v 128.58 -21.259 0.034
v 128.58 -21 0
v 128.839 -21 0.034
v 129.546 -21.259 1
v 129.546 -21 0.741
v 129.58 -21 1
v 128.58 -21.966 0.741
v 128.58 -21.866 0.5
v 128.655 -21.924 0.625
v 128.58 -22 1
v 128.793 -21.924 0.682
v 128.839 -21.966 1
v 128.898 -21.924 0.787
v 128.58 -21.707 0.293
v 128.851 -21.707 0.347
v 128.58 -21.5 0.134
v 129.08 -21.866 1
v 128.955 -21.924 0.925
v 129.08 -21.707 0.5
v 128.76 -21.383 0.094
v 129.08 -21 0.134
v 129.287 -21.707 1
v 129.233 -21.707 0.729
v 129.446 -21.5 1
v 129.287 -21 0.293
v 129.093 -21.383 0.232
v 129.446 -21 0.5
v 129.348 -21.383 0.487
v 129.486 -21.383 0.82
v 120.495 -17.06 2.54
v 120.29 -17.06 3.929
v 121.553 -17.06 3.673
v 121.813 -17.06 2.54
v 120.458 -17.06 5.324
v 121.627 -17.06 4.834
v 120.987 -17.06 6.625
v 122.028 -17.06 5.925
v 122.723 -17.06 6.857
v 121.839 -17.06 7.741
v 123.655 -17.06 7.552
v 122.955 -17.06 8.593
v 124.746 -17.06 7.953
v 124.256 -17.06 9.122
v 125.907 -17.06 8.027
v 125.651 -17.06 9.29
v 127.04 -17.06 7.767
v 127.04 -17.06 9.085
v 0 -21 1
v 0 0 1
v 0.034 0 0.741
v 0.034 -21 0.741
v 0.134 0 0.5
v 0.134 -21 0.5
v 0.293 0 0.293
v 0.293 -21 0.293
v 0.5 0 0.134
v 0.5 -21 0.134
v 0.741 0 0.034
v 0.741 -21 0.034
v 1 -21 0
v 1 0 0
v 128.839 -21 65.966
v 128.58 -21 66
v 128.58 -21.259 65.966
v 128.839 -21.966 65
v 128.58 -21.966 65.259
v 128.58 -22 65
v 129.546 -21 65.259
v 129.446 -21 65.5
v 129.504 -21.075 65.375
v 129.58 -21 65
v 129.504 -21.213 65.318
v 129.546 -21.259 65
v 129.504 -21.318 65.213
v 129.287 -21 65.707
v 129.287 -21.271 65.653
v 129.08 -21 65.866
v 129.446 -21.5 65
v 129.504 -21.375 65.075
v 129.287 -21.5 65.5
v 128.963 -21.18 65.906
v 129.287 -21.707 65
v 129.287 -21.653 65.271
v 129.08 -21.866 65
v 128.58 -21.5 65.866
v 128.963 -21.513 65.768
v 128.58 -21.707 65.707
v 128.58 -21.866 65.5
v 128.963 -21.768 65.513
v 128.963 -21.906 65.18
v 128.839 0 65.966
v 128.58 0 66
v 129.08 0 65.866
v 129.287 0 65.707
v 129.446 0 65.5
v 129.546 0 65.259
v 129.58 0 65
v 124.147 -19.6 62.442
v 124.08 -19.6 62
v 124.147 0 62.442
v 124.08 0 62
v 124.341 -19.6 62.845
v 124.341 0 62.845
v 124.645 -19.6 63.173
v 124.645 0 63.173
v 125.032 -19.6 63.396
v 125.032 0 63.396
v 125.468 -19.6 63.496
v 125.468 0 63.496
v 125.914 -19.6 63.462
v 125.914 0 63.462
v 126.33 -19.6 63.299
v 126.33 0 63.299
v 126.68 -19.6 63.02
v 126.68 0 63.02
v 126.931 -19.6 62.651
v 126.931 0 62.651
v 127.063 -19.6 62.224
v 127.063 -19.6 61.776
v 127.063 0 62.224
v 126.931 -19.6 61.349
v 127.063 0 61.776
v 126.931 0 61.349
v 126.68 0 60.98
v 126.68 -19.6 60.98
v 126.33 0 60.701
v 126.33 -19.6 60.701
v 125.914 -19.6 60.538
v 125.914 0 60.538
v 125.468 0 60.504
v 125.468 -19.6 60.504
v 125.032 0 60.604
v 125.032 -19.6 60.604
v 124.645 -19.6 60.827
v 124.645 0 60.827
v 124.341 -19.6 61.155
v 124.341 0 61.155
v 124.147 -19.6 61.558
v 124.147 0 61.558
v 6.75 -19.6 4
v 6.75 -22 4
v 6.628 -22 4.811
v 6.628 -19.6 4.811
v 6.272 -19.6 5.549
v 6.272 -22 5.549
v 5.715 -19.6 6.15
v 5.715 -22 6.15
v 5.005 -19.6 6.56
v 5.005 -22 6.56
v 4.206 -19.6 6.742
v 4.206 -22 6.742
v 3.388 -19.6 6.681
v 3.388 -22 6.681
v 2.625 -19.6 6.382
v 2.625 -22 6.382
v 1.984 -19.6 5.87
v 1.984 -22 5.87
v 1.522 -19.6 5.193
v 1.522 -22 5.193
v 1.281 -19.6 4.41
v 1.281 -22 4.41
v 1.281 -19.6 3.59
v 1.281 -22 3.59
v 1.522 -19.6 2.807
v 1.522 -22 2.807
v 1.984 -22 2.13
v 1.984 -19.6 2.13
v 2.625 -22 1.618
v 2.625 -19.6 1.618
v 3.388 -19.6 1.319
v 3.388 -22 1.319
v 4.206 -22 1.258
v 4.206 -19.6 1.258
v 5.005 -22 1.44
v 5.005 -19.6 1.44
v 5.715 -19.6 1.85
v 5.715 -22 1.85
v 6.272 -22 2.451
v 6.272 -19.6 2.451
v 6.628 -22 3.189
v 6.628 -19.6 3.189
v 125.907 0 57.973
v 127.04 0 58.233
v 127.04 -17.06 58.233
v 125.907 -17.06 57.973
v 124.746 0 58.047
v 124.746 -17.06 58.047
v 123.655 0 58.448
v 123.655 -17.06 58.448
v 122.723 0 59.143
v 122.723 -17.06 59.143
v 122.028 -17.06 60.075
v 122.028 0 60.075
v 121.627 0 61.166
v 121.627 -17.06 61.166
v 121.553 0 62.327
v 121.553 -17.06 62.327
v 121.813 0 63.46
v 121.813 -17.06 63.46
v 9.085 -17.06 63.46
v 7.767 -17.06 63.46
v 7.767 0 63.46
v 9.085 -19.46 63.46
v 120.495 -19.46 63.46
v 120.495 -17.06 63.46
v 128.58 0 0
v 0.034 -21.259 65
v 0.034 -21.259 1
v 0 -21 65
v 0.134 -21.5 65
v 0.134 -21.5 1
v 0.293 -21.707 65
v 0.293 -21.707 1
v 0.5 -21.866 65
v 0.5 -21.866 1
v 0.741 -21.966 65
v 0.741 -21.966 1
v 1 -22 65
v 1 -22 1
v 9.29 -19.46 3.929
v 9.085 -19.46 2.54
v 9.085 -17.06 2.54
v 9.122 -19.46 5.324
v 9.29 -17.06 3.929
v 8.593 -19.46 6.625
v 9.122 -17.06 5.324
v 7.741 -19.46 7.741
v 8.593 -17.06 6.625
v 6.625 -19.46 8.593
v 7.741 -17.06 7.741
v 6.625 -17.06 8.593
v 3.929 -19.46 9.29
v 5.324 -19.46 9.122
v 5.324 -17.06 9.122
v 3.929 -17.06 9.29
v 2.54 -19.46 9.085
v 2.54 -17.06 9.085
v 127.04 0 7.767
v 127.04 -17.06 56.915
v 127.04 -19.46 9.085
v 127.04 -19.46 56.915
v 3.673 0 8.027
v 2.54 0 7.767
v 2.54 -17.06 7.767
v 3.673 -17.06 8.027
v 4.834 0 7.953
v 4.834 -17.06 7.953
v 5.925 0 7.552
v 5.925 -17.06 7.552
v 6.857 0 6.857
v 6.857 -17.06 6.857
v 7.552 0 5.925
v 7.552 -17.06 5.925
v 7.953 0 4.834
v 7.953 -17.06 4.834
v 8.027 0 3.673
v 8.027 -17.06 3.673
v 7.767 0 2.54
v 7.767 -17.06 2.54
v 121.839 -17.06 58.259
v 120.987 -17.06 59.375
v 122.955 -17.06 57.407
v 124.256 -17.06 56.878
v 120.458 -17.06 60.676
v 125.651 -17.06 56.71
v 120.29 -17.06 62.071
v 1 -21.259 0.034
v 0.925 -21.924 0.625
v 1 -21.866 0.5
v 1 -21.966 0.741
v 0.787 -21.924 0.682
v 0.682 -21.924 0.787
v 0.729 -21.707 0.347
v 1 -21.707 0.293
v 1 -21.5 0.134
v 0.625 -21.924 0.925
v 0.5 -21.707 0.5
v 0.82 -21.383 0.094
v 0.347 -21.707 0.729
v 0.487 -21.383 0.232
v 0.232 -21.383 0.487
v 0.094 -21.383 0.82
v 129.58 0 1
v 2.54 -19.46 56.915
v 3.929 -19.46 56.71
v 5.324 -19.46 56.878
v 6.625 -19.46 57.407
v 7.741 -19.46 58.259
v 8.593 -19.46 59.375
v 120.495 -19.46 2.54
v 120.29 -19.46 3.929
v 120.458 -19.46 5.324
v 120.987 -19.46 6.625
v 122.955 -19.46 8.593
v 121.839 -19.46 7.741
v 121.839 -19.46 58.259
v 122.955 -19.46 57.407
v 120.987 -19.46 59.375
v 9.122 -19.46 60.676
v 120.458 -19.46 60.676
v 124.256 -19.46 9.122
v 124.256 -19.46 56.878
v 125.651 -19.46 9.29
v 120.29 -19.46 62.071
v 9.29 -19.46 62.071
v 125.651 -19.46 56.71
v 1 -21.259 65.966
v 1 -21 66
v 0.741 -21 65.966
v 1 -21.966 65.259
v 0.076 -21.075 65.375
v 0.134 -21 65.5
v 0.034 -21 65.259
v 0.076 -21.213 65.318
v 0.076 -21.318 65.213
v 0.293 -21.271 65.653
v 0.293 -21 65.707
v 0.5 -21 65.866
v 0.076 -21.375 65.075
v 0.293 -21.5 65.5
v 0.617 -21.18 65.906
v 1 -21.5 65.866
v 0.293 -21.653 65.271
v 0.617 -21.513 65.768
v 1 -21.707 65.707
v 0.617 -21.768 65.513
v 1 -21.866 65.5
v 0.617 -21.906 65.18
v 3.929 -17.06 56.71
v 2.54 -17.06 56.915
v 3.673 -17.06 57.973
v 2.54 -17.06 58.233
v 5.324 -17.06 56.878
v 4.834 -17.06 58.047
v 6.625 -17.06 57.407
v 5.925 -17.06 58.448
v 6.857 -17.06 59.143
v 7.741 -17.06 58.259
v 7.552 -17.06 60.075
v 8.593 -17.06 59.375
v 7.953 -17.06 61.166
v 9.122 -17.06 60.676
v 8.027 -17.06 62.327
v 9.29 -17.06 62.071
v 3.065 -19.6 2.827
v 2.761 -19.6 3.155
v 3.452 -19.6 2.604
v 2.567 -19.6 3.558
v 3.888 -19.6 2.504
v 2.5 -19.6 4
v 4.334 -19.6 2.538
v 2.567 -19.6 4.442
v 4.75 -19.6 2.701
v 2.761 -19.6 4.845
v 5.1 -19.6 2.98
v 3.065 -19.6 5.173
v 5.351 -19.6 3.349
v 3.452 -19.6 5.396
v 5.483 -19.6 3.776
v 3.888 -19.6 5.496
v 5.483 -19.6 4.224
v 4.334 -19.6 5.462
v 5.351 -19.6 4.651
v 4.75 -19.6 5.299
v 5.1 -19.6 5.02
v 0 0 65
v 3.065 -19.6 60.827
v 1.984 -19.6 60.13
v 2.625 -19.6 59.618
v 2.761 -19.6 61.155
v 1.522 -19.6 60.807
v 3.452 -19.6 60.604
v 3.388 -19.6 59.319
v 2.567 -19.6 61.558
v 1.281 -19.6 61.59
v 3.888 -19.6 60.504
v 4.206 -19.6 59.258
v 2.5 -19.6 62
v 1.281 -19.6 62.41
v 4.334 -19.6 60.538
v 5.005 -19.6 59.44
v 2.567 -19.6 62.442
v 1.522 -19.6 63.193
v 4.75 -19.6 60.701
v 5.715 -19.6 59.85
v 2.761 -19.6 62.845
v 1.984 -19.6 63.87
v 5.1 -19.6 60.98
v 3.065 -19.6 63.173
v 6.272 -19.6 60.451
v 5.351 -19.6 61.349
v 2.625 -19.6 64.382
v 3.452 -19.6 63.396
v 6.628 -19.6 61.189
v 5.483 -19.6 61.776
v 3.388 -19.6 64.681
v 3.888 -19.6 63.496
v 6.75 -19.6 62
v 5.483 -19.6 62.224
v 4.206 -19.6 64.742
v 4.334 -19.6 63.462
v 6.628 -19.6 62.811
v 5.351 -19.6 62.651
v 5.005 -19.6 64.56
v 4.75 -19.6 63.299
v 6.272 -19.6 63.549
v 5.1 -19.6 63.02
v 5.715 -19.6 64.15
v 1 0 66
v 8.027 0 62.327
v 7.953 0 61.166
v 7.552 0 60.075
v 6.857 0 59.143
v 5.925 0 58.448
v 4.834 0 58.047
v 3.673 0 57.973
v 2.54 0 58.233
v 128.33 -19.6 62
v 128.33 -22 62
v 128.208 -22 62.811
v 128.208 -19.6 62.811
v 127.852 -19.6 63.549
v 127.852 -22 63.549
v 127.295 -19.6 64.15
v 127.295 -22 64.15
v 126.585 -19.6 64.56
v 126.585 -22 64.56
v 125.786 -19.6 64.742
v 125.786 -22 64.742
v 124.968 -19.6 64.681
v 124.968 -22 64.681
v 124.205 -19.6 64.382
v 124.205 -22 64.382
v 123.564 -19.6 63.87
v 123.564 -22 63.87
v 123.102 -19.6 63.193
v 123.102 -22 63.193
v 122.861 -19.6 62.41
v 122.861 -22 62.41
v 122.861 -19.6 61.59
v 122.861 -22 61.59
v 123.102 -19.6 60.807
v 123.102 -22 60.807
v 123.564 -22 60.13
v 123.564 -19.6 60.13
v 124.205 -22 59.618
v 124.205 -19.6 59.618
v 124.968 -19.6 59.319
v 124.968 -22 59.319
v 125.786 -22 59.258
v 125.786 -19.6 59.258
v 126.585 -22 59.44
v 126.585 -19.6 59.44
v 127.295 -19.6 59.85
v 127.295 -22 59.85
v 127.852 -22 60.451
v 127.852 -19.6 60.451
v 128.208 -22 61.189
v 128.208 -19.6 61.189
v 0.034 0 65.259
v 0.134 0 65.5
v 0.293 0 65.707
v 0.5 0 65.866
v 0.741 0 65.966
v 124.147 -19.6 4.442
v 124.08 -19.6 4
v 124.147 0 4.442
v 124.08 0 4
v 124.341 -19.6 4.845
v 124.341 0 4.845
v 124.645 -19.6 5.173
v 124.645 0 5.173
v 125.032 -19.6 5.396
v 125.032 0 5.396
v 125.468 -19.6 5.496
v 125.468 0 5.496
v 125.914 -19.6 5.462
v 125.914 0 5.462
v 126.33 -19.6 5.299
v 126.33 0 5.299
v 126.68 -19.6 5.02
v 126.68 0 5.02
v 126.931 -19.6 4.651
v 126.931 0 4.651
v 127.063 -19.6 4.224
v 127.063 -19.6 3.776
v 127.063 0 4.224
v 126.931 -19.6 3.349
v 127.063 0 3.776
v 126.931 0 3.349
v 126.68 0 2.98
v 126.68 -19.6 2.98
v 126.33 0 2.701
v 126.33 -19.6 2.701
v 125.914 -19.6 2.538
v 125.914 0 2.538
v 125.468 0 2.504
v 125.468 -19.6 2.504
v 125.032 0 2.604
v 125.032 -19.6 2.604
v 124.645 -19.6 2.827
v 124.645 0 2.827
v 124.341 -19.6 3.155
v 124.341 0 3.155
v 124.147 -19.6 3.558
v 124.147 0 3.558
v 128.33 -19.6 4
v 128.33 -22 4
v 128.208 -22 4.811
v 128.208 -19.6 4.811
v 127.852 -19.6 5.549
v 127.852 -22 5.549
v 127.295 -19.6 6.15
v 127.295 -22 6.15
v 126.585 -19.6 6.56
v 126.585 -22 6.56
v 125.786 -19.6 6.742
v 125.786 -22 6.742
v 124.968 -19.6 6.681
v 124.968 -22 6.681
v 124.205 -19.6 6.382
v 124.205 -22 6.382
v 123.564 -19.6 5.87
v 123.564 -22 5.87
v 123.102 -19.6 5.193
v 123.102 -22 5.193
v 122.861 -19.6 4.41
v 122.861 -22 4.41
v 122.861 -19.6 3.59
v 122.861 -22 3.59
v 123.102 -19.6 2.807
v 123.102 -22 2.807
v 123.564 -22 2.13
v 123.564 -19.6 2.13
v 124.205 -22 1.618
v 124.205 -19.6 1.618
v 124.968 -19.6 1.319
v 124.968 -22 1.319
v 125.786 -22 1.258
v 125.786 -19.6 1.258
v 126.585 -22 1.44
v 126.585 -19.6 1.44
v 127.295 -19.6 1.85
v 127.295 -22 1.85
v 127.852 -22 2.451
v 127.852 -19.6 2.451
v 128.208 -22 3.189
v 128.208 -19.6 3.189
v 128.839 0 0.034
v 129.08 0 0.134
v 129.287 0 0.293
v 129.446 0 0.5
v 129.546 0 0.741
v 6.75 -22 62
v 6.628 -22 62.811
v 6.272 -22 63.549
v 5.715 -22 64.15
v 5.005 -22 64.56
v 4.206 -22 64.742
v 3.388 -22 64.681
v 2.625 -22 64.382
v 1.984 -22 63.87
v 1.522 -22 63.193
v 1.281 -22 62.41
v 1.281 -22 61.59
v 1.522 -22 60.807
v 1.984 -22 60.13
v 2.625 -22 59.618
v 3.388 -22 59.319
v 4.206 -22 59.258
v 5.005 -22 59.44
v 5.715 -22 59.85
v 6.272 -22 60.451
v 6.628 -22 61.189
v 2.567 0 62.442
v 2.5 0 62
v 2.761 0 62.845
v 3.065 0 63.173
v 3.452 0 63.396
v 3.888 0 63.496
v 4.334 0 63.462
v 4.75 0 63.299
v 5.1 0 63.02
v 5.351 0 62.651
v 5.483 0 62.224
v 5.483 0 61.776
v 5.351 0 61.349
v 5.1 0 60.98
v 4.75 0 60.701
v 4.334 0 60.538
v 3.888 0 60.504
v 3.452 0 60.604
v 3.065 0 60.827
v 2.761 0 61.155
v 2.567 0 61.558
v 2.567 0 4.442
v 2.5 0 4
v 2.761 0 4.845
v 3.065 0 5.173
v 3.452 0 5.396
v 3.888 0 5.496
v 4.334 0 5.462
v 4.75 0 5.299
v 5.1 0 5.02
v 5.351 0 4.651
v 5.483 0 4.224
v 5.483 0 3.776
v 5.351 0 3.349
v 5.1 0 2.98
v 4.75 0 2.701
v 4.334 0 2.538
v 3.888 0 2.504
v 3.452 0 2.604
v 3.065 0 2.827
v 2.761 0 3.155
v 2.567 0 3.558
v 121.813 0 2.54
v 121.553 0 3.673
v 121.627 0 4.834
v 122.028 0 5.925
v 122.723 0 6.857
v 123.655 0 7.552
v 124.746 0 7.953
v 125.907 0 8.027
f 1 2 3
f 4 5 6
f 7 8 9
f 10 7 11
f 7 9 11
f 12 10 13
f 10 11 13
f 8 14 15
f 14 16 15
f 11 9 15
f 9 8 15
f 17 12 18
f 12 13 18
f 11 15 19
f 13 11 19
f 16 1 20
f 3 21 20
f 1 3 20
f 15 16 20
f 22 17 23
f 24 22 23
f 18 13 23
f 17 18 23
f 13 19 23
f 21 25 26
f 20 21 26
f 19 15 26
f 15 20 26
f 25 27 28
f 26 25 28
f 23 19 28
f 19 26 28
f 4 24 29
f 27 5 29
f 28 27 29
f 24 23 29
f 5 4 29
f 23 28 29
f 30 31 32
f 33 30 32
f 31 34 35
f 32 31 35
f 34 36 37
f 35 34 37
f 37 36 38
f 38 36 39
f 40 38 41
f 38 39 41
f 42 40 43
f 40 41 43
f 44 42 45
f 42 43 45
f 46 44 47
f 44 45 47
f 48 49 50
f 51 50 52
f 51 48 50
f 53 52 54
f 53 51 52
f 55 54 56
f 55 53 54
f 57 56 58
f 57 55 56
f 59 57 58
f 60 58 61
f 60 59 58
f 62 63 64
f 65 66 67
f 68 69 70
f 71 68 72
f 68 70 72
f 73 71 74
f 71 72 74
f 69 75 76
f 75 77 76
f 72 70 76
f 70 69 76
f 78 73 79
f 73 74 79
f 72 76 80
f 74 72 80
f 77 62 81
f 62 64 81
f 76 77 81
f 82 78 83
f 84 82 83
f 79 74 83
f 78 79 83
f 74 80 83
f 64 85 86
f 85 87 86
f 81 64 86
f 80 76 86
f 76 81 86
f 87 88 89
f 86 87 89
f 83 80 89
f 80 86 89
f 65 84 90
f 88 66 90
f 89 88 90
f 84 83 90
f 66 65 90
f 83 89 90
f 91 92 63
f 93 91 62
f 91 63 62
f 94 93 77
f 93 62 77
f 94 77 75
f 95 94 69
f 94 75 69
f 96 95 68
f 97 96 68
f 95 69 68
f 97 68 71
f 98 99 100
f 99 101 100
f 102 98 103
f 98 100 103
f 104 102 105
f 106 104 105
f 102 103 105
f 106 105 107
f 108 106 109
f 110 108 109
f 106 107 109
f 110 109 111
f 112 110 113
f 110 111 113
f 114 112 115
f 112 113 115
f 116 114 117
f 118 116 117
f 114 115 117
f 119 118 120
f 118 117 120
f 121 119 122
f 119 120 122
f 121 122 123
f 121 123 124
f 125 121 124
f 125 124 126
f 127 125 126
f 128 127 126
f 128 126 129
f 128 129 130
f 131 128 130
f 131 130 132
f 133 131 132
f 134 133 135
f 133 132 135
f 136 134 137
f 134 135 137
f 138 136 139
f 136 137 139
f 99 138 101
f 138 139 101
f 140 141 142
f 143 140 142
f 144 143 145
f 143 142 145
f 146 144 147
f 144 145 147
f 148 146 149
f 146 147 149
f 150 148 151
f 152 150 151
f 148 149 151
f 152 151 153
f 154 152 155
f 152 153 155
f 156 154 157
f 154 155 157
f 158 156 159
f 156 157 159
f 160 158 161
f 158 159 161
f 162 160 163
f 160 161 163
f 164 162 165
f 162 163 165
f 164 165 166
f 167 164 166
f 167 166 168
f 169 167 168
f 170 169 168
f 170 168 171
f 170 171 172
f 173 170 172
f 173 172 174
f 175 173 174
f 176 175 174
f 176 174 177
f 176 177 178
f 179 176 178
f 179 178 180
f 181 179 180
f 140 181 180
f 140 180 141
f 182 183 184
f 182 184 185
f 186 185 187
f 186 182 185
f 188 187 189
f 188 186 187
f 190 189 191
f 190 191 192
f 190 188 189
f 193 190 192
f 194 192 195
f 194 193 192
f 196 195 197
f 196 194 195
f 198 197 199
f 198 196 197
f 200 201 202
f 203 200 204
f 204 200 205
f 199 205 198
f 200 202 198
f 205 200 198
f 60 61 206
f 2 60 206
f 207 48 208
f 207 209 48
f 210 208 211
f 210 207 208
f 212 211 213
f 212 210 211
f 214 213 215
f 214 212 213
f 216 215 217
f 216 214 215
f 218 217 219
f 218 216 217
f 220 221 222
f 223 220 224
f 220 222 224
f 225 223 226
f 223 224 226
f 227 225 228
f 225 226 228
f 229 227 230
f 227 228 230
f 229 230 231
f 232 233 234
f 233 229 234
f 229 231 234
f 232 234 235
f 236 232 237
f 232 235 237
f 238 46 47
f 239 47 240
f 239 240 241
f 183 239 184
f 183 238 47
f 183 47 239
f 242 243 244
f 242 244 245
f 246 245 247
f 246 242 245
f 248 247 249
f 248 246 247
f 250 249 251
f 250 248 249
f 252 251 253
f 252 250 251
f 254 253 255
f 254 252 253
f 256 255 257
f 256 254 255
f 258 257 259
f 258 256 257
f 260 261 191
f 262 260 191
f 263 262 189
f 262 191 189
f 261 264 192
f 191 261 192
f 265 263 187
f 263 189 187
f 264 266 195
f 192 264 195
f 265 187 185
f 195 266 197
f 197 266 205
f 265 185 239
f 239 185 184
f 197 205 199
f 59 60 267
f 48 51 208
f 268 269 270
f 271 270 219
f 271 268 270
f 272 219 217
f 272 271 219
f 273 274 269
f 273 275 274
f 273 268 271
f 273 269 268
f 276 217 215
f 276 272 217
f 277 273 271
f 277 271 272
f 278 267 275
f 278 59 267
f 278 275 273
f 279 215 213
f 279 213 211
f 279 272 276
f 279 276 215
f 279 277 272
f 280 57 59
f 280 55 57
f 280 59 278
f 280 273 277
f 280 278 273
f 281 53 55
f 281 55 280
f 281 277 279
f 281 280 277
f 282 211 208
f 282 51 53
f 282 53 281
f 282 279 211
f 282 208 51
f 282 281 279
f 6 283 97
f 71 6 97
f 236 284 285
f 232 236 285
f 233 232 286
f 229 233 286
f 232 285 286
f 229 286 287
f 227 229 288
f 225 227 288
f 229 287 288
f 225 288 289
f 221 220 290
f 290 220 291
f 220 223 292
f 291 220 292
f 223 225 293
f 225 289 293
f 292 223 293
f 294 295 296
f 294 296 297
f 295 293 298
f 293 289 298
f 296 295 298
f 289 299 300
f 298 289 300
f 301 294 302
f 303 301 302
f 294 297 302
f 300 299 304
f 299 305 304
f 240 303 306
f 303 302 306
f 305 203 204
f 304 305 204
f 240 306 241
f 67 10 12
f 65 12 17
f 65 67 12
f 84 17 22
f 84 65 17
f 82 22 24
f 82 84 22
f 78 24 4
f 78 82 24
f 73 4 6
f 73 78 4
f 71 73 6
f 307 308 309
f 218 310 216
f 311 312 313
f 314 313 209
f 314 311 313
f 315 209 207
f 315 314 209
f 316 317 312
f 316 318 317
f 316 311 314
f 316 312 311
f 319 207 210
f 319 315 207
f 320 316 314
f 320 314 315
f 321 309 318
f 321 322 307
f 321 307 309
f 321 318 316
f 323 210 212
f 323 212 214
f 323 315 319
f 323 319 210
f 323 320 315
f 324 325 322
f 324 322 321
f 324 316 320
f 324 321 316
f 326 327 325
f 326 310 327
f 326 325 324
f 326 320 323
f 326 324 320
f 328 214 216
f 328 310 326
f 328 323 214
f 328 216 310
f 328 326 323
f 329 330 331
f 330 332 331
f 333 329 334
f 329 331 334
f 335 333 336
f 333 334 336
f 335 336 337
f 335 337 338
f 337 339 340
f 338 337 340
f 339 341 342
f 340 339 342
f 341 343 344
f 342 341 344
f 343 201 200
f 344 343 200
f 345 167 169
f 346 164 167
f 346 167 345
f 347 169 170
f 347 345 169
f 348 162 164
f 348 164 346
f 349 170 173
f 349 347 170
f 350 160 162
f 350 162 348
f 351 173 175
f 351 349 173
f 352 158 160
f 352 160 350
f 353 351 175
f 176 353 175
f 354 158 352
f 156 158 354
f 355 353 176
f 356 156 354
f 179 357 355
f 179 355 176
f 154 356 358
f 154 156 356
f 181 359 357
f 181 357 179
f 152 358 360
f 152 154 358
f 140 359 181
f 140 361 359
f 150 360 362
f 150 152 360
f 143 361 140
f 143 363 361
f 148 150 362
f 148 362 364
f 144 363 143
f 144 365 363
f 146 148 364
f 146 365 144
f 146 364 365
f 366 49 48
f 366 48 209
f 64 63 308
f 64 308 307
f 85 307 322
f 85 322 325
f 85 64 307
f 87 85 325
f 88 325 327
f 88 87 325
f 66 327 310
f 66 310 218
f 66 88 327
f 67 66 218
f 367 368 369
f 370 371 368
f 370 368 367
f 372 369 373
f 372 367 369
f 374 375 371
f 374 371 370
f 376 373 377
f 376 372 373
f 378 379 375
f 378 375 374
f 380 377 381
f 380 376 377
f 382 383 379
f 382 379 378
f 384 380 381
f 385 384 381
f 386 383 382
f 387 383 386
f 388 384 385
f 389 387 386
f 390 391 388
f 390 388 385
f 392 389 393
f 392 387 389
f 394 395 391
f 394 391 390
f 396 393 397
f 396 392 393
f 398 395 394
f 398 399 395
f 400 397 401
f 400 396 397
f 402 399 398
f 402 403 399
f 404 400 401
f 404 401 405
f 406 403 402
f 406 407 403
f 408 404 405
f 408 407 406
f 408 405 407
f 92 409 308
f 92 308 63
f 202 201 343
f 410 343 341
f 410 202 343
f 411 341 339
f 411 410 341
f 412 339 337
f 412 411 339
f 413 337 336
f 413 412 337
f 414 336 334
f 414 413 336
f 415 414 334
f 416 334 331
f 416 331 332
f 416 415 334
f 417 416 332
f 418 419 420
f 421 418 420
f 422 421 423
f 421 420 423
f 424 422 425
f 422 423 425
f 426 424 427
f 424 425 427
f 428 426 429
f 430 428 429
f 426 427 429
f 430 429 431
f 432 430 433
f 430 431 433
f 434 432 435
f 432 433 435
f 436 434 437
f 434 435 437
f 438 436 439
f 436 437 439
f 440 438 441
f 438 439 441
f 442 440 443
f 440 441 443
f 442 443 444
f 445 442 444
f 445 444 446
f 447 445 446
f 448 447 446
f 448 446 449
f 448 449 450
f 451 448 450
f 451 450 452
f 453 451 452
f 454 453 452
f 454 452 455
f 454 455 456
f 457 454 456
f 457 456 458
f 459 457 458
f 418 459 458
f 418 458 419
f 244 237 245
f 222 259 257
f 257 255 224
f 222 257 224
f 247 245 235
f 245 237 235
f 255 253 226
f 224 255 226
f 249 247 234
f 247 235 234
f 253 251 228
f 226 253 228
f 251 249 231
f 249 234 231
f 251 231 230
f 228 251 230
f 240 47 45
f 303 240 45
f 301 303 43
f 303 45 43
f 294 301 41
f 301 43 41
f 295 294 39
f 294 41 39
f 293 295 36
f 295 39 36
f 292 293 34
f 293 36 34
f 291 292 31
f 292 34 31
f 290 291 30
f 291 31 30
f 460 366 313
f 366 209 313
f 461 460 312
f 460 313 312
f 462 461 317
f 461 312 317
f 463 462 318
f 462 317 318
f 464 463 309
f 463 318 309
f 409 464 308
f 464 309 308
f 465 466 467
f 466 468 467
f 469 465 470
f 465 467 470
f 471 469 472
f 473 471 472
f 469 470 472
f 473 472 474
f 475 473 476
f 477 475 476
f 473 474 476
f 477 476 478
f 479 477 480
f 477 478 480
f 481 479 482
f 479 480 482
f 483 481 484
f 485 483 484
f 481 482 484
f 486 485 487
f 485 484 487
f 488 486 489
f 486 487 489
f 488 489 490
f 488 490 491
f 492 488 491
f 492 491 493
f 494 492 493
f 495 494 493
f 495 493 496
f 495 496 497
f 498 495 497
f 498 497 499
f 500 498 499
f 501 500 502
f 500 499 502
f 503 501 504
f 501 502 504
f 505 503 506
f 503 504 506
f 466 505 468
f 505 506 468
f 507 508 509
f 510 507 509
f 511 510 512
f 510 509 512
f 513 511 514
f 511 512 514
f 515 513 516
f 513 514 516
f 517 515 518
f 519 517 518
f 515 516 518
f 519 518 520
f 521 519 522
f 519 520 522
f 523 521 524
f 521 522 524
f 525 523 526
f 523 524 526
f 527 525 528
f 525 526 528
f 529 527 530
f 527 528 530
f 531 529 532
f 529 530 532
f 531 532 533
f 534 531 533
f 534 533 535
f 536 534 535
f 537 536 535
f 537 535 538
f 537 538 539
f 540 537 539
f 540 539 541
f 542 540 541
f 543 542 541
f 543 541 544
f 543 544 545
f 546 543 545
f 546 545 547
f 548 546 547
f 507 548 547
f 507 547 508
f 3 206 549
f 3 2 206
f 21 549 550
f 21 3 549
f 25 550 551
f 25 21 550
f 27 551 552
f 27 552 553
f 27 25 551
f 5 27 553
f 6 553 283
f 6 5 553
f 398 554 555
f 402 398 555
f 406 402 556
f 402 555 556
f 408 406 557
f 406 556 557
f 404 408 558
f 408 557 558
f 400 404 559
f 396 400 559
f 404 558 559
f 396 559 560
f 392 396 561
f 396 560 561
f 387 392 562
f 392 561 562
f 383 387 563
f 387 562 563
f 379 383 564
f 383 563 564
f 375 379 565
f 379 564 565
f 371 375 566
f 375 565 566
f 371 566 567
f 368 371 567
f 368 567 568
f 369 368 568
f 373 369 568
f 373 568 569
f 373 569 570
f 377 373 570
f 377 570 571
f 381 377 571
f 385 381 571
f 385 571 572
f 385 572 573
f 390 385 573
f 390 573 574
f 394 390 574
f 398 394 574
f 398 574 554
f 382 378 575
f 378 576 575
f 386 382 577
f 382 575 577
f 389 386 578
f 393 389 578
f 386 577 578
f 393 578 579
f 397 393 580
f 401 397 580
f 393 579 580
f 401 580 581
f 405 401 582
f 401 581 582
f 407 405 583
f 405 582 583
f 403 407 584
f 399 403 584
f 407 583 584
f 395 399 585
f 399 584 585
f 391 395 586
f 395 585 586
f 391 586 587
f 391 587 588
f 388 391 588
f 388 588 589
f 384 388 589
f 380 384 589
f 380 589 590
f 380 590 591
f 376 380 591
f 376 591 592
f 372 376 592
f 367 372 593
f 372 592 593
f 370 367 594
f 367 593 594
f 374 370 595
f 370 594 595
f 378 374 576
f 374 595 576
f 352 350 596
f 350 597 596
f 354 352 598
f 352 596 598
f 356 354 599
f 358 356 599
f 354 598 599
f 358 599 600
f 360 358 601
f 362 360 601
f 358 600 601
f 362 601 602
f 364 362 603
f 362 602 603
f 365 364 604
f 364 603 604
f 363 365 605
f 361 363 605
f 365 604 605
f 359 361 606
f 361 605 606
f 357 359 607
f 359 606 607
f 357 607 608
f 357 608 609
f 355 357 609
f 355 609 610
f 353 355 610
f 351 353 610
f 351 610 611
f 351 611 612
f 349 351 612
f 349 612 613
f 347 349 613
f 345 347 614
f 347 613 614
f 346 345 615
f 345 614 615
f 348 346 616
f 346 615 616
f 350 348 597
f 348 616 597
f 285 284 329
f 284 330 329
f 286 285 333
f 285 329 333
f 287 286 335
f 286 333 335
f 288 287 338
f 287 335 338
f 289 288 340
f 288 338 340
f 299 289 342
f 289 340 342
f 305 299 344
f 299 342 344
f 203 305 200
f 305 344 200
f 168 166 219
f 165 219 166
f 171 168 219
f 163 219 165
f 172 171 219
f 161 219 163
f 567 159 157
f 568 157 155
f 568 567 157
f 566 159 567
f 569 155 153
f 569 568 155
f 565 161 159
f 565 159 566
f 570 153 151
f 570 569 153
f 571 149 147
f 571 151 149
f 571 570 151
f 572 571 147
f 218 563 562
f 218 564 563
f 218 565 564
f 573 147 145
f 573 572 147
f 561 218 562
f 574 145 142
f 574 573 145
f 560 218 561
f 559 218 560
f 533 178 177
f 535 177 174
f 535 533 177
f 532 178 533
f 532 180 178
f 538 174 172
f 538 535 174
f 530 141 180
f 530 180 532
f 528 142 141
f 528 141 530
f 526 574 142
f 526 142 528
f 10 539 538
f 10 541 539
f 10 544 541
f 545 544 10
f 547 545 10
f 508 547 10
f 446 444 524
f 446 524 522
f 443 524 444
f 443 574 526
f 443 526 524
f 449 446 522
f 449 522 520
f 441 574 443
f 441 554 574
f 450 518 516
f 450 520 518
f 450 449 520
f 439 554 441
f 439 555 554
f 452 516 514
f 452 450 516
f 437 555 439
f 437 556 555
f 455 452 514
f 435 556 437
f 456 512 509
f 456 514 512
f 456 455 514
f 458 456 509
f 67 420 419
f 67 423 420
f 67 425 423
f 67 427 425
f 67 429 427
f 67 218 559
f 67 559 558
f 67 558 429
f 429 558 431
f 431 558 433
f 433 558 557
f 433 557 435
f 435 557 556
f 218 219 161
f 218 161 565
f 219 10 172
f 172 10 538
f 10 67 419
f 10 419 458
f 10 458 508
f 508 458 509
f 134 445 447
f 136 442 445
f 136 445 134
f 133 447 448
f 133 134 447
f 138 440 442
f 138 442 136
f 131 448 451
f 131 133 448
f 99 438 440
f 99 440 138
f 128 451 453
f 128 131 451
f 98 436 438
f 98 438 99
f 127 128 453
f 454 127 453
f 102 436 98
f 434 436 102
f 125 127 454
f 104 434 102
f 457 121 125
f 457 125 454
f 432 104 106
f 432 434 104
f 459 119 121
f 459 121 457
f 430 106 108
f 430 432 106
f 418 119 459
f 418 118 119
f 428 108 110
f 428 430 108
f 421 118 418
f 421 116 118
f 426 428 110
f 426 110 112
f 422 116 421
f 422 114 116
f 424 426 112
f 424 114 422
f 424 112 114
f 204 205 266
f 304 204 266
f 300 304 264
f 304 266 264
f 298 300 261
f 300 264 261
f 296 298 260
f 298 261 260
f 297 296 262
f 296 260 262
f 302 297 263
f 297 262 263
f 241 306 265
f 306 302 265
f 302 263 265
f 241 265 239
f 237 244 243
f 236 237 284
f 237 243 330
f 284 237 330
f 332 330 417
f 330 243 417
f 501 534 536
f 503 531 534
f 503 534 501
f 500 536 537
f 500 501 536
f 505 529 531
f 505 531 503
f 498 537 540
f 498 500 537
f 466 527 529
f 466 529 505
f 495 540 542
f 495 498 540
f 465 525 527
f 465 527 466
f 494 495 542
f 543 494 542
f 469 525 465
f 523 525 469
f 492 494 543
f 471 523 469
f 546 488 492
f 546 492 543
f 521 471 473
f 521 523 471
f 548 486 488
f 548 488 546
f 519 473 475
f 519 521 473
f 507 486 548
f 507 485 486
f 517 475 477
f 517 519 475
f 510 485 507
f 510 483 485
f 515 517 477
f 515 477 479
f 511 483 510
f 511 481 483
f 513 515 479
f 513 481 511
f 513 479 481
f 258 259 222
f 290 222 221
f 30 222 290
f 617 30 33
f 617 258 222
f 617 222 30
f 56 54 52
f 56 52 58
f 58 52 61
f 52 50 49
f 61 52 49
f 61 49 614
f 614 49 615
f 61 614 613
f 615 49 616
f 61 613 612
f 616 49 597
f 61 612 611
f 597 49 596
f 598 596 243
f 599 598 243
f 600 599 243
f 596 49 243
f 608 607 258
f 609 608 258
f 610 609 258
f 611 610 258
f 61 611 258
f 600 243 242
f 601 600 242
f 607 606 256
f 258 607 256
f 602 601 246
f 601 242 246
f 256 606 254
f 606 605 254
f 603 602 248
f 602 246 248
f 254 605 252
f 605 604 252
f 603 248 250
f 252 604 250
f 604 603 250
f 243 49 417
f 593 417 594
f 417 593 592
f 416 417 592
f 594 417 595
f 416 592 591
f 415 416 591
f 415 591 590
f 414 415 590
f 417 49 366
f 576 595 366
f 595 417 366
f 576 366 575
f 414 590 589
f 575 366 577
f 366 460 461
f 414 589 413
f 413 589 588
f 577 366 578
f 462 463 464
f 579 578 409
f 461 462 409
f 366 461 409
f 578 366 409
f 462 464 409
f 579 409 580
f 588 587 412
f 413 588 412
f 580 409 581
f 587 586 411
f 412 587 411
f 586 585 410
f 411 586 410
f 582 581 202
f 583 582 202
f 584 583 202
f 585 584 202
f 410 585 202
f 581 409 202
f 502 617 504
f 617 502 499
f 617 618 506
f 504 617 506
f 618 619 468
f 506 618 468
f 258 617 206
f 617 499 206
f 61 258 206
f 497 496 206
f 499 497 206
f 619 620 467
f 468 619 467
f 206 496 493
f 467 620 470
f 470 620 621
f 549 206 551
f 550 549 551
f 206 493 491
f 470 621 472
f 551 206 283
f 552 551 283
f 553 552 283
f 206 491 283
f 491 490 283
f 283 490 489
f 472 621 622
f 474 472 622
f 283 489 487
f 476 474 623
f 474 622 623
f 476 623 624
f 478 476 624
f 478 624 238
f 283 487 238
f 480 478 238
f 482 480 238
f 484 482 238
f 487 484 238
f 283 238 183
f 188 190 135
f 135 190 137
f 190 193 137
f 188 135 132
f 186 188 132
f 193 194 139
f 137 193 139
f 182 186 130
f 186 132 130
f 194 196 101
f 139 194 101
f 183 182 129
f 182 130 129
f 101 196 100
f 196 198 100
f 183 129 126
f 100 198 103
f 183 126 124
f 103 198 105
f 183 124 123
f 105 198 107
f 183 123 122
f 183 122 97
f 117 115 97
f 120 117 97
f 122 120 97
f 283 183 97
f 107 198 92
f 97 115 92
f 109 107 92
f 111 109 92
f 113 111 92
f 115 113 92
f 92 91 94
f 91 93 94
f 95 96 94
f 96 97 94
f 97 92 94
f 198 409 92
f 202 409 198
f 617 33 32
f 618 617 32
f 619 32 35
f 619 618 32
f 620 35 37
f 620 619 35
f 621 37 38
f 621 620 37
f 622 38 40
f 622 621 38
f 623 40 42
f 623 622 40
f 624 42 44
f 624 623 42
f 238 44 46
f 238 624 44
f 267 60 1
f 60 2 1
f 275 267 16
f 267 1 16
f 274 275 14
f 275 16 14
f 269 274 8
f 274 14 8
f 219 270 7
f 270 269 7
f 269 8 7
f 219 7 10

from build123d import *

# Parameters (mm, degrees)
F0_W           = 129.58
F0_H           = 66
F1_DEPTH       = 22
F3_D           = 3
F3_CBORE_D     = 5.5
F3_CBORE_DEPTH = 2.4
F4_T           = 2.54
F5_R           = 1


# Not quite as in the source:
# - a shell that OpenCascade refuses in one call is made with other operations: the cavity is built on its own and cut out


with BuildPart() as f1:
    # F0 (on Front) → F1 (new body)
    with BuildSketch(Plane.XZ):
        with Locations((64.79, 33)):
            Rectangle(F0_W, F0_H)
    extrude(amount=F1_DEPTH)

    # F3 (through all)
    with Locations(Plane.XZ.offset(22)):
        with Locations((4, 62), (4, 4), (125.58, 4), (125.58, 62)):
            CounterBoreHole(F3_D / 2, F3_CBORE_D / 2, F3_CBORE_DEPTH)

    # F4: shell of thickness 2.54, made by hand


with BuildPart() as f4_core1:
    # F4_t2: copy of F1
    add(f1.part)

    # the walls: a layer under each face that stays
    f4_faces = [f4_core1.faces().sort_by_distance(p)[0] for p in [
        (0, -11, 33),
        (64.79, -11, 66),
        (64.79, -11, 0),
        (64.79, -22, 33),
        (129.58, -11, 33),
        (2.5, -9.8, 4),
        (124.08, -9.8, 4),
        (2.5, -9.8, 62),
        (124.08, -9.8, 62),
        (1.25, -20.8, 4),
        (122.83, -20.8, 4),
        (1.25, -20.8, 62),
        (122.83, -20.8, 62),
        (2.1666666667, -19.6, 2.1666666667),
        (123.7466666667, -19.6, 2.1666666667),
        (2.1666666667, -19.6, 60.1666666667),
        (123.7466666667, -19.6, 60.1666666667),
    ]]
    thicken(f4_faces, amount=-F4_T, mode=Mode.SUBTRACT)

    # F4_s3 → F4_t4 (revolve, cut)
    with BuildSketch(Plane.XY.offset(4)):
        Polygon((6.7246, -19.6254), (9.29, -19.6), (9.29, -17.06), (6.75, -17.06), align=None)
    revolve(axis=Axis((4, -19.6, 4), (0, -1, 0)), mode=Mode.SUBTRACT)

    # F4_s5 → F4_t6 (revolve, cut)
    with BuildSketch(Plane.XY.offset(4)):
        Polygon((128.3046, -19.6254), (130.87, -19.6), (130.87, -17.06), (128.33, -17.06), align=None)
    revolve(axis=Axis((125.58, -19.6, 4), (0, -1, 0)), mode=Mode.SUBTRACT)

    # F4_s7 → F4_t8 (revolve, cut)
    with BuildSketch(Plane.XY.offset(62)):
        Polygon((6.7246, -19.6254), (9.29, -19.6), (9.29, -17.06), (6.75, -17.06), align=None)
    revolve(axis=Axis((4, -19.6, 62), (0, -1, 0)), mode=Mode.SUBTRACT)

    # F4_s9 → F4_t10 (revolve, cut)
    with BuildSketch(Plane.XY.offset(62)):
        Polygon((128.3046, -19.6254), (130.87, -19.6), (130.87, -17.06), (128.33, -17.06), align=None)
    revolve(axis=Axis((125.58, -19.6, 62), (0, -1, 0)), mode=Mode.SUBTRACT)


with BuildPart() as f1_1:
    add(f1.part)

    # what is left inside the walls is the cavity
    f4_cavity = [f4_core1.part.solids().sort_by_distance(p)[0] for p in [
        (64.79, -0.0254, 22.846667),
    ]]
    add(f4_cavity, mode=Mode.SUBTRACT)

    # F5
    f5_edges = [f1_1.edges().sort_by_distance(p)[0] for p in [
        (64.79, -22, 66),
        (0, -11, 66),
        (0, -11, 0),
        (129.58, -11, 66),
        (129.58, -11, 0),
        (64.79, -22, 0),
        (129.58, -22, 33),
        (0, -22, 33),
    ]]
    fillet(f5_edges, radius=F5_R)


solid = f1_1.part
